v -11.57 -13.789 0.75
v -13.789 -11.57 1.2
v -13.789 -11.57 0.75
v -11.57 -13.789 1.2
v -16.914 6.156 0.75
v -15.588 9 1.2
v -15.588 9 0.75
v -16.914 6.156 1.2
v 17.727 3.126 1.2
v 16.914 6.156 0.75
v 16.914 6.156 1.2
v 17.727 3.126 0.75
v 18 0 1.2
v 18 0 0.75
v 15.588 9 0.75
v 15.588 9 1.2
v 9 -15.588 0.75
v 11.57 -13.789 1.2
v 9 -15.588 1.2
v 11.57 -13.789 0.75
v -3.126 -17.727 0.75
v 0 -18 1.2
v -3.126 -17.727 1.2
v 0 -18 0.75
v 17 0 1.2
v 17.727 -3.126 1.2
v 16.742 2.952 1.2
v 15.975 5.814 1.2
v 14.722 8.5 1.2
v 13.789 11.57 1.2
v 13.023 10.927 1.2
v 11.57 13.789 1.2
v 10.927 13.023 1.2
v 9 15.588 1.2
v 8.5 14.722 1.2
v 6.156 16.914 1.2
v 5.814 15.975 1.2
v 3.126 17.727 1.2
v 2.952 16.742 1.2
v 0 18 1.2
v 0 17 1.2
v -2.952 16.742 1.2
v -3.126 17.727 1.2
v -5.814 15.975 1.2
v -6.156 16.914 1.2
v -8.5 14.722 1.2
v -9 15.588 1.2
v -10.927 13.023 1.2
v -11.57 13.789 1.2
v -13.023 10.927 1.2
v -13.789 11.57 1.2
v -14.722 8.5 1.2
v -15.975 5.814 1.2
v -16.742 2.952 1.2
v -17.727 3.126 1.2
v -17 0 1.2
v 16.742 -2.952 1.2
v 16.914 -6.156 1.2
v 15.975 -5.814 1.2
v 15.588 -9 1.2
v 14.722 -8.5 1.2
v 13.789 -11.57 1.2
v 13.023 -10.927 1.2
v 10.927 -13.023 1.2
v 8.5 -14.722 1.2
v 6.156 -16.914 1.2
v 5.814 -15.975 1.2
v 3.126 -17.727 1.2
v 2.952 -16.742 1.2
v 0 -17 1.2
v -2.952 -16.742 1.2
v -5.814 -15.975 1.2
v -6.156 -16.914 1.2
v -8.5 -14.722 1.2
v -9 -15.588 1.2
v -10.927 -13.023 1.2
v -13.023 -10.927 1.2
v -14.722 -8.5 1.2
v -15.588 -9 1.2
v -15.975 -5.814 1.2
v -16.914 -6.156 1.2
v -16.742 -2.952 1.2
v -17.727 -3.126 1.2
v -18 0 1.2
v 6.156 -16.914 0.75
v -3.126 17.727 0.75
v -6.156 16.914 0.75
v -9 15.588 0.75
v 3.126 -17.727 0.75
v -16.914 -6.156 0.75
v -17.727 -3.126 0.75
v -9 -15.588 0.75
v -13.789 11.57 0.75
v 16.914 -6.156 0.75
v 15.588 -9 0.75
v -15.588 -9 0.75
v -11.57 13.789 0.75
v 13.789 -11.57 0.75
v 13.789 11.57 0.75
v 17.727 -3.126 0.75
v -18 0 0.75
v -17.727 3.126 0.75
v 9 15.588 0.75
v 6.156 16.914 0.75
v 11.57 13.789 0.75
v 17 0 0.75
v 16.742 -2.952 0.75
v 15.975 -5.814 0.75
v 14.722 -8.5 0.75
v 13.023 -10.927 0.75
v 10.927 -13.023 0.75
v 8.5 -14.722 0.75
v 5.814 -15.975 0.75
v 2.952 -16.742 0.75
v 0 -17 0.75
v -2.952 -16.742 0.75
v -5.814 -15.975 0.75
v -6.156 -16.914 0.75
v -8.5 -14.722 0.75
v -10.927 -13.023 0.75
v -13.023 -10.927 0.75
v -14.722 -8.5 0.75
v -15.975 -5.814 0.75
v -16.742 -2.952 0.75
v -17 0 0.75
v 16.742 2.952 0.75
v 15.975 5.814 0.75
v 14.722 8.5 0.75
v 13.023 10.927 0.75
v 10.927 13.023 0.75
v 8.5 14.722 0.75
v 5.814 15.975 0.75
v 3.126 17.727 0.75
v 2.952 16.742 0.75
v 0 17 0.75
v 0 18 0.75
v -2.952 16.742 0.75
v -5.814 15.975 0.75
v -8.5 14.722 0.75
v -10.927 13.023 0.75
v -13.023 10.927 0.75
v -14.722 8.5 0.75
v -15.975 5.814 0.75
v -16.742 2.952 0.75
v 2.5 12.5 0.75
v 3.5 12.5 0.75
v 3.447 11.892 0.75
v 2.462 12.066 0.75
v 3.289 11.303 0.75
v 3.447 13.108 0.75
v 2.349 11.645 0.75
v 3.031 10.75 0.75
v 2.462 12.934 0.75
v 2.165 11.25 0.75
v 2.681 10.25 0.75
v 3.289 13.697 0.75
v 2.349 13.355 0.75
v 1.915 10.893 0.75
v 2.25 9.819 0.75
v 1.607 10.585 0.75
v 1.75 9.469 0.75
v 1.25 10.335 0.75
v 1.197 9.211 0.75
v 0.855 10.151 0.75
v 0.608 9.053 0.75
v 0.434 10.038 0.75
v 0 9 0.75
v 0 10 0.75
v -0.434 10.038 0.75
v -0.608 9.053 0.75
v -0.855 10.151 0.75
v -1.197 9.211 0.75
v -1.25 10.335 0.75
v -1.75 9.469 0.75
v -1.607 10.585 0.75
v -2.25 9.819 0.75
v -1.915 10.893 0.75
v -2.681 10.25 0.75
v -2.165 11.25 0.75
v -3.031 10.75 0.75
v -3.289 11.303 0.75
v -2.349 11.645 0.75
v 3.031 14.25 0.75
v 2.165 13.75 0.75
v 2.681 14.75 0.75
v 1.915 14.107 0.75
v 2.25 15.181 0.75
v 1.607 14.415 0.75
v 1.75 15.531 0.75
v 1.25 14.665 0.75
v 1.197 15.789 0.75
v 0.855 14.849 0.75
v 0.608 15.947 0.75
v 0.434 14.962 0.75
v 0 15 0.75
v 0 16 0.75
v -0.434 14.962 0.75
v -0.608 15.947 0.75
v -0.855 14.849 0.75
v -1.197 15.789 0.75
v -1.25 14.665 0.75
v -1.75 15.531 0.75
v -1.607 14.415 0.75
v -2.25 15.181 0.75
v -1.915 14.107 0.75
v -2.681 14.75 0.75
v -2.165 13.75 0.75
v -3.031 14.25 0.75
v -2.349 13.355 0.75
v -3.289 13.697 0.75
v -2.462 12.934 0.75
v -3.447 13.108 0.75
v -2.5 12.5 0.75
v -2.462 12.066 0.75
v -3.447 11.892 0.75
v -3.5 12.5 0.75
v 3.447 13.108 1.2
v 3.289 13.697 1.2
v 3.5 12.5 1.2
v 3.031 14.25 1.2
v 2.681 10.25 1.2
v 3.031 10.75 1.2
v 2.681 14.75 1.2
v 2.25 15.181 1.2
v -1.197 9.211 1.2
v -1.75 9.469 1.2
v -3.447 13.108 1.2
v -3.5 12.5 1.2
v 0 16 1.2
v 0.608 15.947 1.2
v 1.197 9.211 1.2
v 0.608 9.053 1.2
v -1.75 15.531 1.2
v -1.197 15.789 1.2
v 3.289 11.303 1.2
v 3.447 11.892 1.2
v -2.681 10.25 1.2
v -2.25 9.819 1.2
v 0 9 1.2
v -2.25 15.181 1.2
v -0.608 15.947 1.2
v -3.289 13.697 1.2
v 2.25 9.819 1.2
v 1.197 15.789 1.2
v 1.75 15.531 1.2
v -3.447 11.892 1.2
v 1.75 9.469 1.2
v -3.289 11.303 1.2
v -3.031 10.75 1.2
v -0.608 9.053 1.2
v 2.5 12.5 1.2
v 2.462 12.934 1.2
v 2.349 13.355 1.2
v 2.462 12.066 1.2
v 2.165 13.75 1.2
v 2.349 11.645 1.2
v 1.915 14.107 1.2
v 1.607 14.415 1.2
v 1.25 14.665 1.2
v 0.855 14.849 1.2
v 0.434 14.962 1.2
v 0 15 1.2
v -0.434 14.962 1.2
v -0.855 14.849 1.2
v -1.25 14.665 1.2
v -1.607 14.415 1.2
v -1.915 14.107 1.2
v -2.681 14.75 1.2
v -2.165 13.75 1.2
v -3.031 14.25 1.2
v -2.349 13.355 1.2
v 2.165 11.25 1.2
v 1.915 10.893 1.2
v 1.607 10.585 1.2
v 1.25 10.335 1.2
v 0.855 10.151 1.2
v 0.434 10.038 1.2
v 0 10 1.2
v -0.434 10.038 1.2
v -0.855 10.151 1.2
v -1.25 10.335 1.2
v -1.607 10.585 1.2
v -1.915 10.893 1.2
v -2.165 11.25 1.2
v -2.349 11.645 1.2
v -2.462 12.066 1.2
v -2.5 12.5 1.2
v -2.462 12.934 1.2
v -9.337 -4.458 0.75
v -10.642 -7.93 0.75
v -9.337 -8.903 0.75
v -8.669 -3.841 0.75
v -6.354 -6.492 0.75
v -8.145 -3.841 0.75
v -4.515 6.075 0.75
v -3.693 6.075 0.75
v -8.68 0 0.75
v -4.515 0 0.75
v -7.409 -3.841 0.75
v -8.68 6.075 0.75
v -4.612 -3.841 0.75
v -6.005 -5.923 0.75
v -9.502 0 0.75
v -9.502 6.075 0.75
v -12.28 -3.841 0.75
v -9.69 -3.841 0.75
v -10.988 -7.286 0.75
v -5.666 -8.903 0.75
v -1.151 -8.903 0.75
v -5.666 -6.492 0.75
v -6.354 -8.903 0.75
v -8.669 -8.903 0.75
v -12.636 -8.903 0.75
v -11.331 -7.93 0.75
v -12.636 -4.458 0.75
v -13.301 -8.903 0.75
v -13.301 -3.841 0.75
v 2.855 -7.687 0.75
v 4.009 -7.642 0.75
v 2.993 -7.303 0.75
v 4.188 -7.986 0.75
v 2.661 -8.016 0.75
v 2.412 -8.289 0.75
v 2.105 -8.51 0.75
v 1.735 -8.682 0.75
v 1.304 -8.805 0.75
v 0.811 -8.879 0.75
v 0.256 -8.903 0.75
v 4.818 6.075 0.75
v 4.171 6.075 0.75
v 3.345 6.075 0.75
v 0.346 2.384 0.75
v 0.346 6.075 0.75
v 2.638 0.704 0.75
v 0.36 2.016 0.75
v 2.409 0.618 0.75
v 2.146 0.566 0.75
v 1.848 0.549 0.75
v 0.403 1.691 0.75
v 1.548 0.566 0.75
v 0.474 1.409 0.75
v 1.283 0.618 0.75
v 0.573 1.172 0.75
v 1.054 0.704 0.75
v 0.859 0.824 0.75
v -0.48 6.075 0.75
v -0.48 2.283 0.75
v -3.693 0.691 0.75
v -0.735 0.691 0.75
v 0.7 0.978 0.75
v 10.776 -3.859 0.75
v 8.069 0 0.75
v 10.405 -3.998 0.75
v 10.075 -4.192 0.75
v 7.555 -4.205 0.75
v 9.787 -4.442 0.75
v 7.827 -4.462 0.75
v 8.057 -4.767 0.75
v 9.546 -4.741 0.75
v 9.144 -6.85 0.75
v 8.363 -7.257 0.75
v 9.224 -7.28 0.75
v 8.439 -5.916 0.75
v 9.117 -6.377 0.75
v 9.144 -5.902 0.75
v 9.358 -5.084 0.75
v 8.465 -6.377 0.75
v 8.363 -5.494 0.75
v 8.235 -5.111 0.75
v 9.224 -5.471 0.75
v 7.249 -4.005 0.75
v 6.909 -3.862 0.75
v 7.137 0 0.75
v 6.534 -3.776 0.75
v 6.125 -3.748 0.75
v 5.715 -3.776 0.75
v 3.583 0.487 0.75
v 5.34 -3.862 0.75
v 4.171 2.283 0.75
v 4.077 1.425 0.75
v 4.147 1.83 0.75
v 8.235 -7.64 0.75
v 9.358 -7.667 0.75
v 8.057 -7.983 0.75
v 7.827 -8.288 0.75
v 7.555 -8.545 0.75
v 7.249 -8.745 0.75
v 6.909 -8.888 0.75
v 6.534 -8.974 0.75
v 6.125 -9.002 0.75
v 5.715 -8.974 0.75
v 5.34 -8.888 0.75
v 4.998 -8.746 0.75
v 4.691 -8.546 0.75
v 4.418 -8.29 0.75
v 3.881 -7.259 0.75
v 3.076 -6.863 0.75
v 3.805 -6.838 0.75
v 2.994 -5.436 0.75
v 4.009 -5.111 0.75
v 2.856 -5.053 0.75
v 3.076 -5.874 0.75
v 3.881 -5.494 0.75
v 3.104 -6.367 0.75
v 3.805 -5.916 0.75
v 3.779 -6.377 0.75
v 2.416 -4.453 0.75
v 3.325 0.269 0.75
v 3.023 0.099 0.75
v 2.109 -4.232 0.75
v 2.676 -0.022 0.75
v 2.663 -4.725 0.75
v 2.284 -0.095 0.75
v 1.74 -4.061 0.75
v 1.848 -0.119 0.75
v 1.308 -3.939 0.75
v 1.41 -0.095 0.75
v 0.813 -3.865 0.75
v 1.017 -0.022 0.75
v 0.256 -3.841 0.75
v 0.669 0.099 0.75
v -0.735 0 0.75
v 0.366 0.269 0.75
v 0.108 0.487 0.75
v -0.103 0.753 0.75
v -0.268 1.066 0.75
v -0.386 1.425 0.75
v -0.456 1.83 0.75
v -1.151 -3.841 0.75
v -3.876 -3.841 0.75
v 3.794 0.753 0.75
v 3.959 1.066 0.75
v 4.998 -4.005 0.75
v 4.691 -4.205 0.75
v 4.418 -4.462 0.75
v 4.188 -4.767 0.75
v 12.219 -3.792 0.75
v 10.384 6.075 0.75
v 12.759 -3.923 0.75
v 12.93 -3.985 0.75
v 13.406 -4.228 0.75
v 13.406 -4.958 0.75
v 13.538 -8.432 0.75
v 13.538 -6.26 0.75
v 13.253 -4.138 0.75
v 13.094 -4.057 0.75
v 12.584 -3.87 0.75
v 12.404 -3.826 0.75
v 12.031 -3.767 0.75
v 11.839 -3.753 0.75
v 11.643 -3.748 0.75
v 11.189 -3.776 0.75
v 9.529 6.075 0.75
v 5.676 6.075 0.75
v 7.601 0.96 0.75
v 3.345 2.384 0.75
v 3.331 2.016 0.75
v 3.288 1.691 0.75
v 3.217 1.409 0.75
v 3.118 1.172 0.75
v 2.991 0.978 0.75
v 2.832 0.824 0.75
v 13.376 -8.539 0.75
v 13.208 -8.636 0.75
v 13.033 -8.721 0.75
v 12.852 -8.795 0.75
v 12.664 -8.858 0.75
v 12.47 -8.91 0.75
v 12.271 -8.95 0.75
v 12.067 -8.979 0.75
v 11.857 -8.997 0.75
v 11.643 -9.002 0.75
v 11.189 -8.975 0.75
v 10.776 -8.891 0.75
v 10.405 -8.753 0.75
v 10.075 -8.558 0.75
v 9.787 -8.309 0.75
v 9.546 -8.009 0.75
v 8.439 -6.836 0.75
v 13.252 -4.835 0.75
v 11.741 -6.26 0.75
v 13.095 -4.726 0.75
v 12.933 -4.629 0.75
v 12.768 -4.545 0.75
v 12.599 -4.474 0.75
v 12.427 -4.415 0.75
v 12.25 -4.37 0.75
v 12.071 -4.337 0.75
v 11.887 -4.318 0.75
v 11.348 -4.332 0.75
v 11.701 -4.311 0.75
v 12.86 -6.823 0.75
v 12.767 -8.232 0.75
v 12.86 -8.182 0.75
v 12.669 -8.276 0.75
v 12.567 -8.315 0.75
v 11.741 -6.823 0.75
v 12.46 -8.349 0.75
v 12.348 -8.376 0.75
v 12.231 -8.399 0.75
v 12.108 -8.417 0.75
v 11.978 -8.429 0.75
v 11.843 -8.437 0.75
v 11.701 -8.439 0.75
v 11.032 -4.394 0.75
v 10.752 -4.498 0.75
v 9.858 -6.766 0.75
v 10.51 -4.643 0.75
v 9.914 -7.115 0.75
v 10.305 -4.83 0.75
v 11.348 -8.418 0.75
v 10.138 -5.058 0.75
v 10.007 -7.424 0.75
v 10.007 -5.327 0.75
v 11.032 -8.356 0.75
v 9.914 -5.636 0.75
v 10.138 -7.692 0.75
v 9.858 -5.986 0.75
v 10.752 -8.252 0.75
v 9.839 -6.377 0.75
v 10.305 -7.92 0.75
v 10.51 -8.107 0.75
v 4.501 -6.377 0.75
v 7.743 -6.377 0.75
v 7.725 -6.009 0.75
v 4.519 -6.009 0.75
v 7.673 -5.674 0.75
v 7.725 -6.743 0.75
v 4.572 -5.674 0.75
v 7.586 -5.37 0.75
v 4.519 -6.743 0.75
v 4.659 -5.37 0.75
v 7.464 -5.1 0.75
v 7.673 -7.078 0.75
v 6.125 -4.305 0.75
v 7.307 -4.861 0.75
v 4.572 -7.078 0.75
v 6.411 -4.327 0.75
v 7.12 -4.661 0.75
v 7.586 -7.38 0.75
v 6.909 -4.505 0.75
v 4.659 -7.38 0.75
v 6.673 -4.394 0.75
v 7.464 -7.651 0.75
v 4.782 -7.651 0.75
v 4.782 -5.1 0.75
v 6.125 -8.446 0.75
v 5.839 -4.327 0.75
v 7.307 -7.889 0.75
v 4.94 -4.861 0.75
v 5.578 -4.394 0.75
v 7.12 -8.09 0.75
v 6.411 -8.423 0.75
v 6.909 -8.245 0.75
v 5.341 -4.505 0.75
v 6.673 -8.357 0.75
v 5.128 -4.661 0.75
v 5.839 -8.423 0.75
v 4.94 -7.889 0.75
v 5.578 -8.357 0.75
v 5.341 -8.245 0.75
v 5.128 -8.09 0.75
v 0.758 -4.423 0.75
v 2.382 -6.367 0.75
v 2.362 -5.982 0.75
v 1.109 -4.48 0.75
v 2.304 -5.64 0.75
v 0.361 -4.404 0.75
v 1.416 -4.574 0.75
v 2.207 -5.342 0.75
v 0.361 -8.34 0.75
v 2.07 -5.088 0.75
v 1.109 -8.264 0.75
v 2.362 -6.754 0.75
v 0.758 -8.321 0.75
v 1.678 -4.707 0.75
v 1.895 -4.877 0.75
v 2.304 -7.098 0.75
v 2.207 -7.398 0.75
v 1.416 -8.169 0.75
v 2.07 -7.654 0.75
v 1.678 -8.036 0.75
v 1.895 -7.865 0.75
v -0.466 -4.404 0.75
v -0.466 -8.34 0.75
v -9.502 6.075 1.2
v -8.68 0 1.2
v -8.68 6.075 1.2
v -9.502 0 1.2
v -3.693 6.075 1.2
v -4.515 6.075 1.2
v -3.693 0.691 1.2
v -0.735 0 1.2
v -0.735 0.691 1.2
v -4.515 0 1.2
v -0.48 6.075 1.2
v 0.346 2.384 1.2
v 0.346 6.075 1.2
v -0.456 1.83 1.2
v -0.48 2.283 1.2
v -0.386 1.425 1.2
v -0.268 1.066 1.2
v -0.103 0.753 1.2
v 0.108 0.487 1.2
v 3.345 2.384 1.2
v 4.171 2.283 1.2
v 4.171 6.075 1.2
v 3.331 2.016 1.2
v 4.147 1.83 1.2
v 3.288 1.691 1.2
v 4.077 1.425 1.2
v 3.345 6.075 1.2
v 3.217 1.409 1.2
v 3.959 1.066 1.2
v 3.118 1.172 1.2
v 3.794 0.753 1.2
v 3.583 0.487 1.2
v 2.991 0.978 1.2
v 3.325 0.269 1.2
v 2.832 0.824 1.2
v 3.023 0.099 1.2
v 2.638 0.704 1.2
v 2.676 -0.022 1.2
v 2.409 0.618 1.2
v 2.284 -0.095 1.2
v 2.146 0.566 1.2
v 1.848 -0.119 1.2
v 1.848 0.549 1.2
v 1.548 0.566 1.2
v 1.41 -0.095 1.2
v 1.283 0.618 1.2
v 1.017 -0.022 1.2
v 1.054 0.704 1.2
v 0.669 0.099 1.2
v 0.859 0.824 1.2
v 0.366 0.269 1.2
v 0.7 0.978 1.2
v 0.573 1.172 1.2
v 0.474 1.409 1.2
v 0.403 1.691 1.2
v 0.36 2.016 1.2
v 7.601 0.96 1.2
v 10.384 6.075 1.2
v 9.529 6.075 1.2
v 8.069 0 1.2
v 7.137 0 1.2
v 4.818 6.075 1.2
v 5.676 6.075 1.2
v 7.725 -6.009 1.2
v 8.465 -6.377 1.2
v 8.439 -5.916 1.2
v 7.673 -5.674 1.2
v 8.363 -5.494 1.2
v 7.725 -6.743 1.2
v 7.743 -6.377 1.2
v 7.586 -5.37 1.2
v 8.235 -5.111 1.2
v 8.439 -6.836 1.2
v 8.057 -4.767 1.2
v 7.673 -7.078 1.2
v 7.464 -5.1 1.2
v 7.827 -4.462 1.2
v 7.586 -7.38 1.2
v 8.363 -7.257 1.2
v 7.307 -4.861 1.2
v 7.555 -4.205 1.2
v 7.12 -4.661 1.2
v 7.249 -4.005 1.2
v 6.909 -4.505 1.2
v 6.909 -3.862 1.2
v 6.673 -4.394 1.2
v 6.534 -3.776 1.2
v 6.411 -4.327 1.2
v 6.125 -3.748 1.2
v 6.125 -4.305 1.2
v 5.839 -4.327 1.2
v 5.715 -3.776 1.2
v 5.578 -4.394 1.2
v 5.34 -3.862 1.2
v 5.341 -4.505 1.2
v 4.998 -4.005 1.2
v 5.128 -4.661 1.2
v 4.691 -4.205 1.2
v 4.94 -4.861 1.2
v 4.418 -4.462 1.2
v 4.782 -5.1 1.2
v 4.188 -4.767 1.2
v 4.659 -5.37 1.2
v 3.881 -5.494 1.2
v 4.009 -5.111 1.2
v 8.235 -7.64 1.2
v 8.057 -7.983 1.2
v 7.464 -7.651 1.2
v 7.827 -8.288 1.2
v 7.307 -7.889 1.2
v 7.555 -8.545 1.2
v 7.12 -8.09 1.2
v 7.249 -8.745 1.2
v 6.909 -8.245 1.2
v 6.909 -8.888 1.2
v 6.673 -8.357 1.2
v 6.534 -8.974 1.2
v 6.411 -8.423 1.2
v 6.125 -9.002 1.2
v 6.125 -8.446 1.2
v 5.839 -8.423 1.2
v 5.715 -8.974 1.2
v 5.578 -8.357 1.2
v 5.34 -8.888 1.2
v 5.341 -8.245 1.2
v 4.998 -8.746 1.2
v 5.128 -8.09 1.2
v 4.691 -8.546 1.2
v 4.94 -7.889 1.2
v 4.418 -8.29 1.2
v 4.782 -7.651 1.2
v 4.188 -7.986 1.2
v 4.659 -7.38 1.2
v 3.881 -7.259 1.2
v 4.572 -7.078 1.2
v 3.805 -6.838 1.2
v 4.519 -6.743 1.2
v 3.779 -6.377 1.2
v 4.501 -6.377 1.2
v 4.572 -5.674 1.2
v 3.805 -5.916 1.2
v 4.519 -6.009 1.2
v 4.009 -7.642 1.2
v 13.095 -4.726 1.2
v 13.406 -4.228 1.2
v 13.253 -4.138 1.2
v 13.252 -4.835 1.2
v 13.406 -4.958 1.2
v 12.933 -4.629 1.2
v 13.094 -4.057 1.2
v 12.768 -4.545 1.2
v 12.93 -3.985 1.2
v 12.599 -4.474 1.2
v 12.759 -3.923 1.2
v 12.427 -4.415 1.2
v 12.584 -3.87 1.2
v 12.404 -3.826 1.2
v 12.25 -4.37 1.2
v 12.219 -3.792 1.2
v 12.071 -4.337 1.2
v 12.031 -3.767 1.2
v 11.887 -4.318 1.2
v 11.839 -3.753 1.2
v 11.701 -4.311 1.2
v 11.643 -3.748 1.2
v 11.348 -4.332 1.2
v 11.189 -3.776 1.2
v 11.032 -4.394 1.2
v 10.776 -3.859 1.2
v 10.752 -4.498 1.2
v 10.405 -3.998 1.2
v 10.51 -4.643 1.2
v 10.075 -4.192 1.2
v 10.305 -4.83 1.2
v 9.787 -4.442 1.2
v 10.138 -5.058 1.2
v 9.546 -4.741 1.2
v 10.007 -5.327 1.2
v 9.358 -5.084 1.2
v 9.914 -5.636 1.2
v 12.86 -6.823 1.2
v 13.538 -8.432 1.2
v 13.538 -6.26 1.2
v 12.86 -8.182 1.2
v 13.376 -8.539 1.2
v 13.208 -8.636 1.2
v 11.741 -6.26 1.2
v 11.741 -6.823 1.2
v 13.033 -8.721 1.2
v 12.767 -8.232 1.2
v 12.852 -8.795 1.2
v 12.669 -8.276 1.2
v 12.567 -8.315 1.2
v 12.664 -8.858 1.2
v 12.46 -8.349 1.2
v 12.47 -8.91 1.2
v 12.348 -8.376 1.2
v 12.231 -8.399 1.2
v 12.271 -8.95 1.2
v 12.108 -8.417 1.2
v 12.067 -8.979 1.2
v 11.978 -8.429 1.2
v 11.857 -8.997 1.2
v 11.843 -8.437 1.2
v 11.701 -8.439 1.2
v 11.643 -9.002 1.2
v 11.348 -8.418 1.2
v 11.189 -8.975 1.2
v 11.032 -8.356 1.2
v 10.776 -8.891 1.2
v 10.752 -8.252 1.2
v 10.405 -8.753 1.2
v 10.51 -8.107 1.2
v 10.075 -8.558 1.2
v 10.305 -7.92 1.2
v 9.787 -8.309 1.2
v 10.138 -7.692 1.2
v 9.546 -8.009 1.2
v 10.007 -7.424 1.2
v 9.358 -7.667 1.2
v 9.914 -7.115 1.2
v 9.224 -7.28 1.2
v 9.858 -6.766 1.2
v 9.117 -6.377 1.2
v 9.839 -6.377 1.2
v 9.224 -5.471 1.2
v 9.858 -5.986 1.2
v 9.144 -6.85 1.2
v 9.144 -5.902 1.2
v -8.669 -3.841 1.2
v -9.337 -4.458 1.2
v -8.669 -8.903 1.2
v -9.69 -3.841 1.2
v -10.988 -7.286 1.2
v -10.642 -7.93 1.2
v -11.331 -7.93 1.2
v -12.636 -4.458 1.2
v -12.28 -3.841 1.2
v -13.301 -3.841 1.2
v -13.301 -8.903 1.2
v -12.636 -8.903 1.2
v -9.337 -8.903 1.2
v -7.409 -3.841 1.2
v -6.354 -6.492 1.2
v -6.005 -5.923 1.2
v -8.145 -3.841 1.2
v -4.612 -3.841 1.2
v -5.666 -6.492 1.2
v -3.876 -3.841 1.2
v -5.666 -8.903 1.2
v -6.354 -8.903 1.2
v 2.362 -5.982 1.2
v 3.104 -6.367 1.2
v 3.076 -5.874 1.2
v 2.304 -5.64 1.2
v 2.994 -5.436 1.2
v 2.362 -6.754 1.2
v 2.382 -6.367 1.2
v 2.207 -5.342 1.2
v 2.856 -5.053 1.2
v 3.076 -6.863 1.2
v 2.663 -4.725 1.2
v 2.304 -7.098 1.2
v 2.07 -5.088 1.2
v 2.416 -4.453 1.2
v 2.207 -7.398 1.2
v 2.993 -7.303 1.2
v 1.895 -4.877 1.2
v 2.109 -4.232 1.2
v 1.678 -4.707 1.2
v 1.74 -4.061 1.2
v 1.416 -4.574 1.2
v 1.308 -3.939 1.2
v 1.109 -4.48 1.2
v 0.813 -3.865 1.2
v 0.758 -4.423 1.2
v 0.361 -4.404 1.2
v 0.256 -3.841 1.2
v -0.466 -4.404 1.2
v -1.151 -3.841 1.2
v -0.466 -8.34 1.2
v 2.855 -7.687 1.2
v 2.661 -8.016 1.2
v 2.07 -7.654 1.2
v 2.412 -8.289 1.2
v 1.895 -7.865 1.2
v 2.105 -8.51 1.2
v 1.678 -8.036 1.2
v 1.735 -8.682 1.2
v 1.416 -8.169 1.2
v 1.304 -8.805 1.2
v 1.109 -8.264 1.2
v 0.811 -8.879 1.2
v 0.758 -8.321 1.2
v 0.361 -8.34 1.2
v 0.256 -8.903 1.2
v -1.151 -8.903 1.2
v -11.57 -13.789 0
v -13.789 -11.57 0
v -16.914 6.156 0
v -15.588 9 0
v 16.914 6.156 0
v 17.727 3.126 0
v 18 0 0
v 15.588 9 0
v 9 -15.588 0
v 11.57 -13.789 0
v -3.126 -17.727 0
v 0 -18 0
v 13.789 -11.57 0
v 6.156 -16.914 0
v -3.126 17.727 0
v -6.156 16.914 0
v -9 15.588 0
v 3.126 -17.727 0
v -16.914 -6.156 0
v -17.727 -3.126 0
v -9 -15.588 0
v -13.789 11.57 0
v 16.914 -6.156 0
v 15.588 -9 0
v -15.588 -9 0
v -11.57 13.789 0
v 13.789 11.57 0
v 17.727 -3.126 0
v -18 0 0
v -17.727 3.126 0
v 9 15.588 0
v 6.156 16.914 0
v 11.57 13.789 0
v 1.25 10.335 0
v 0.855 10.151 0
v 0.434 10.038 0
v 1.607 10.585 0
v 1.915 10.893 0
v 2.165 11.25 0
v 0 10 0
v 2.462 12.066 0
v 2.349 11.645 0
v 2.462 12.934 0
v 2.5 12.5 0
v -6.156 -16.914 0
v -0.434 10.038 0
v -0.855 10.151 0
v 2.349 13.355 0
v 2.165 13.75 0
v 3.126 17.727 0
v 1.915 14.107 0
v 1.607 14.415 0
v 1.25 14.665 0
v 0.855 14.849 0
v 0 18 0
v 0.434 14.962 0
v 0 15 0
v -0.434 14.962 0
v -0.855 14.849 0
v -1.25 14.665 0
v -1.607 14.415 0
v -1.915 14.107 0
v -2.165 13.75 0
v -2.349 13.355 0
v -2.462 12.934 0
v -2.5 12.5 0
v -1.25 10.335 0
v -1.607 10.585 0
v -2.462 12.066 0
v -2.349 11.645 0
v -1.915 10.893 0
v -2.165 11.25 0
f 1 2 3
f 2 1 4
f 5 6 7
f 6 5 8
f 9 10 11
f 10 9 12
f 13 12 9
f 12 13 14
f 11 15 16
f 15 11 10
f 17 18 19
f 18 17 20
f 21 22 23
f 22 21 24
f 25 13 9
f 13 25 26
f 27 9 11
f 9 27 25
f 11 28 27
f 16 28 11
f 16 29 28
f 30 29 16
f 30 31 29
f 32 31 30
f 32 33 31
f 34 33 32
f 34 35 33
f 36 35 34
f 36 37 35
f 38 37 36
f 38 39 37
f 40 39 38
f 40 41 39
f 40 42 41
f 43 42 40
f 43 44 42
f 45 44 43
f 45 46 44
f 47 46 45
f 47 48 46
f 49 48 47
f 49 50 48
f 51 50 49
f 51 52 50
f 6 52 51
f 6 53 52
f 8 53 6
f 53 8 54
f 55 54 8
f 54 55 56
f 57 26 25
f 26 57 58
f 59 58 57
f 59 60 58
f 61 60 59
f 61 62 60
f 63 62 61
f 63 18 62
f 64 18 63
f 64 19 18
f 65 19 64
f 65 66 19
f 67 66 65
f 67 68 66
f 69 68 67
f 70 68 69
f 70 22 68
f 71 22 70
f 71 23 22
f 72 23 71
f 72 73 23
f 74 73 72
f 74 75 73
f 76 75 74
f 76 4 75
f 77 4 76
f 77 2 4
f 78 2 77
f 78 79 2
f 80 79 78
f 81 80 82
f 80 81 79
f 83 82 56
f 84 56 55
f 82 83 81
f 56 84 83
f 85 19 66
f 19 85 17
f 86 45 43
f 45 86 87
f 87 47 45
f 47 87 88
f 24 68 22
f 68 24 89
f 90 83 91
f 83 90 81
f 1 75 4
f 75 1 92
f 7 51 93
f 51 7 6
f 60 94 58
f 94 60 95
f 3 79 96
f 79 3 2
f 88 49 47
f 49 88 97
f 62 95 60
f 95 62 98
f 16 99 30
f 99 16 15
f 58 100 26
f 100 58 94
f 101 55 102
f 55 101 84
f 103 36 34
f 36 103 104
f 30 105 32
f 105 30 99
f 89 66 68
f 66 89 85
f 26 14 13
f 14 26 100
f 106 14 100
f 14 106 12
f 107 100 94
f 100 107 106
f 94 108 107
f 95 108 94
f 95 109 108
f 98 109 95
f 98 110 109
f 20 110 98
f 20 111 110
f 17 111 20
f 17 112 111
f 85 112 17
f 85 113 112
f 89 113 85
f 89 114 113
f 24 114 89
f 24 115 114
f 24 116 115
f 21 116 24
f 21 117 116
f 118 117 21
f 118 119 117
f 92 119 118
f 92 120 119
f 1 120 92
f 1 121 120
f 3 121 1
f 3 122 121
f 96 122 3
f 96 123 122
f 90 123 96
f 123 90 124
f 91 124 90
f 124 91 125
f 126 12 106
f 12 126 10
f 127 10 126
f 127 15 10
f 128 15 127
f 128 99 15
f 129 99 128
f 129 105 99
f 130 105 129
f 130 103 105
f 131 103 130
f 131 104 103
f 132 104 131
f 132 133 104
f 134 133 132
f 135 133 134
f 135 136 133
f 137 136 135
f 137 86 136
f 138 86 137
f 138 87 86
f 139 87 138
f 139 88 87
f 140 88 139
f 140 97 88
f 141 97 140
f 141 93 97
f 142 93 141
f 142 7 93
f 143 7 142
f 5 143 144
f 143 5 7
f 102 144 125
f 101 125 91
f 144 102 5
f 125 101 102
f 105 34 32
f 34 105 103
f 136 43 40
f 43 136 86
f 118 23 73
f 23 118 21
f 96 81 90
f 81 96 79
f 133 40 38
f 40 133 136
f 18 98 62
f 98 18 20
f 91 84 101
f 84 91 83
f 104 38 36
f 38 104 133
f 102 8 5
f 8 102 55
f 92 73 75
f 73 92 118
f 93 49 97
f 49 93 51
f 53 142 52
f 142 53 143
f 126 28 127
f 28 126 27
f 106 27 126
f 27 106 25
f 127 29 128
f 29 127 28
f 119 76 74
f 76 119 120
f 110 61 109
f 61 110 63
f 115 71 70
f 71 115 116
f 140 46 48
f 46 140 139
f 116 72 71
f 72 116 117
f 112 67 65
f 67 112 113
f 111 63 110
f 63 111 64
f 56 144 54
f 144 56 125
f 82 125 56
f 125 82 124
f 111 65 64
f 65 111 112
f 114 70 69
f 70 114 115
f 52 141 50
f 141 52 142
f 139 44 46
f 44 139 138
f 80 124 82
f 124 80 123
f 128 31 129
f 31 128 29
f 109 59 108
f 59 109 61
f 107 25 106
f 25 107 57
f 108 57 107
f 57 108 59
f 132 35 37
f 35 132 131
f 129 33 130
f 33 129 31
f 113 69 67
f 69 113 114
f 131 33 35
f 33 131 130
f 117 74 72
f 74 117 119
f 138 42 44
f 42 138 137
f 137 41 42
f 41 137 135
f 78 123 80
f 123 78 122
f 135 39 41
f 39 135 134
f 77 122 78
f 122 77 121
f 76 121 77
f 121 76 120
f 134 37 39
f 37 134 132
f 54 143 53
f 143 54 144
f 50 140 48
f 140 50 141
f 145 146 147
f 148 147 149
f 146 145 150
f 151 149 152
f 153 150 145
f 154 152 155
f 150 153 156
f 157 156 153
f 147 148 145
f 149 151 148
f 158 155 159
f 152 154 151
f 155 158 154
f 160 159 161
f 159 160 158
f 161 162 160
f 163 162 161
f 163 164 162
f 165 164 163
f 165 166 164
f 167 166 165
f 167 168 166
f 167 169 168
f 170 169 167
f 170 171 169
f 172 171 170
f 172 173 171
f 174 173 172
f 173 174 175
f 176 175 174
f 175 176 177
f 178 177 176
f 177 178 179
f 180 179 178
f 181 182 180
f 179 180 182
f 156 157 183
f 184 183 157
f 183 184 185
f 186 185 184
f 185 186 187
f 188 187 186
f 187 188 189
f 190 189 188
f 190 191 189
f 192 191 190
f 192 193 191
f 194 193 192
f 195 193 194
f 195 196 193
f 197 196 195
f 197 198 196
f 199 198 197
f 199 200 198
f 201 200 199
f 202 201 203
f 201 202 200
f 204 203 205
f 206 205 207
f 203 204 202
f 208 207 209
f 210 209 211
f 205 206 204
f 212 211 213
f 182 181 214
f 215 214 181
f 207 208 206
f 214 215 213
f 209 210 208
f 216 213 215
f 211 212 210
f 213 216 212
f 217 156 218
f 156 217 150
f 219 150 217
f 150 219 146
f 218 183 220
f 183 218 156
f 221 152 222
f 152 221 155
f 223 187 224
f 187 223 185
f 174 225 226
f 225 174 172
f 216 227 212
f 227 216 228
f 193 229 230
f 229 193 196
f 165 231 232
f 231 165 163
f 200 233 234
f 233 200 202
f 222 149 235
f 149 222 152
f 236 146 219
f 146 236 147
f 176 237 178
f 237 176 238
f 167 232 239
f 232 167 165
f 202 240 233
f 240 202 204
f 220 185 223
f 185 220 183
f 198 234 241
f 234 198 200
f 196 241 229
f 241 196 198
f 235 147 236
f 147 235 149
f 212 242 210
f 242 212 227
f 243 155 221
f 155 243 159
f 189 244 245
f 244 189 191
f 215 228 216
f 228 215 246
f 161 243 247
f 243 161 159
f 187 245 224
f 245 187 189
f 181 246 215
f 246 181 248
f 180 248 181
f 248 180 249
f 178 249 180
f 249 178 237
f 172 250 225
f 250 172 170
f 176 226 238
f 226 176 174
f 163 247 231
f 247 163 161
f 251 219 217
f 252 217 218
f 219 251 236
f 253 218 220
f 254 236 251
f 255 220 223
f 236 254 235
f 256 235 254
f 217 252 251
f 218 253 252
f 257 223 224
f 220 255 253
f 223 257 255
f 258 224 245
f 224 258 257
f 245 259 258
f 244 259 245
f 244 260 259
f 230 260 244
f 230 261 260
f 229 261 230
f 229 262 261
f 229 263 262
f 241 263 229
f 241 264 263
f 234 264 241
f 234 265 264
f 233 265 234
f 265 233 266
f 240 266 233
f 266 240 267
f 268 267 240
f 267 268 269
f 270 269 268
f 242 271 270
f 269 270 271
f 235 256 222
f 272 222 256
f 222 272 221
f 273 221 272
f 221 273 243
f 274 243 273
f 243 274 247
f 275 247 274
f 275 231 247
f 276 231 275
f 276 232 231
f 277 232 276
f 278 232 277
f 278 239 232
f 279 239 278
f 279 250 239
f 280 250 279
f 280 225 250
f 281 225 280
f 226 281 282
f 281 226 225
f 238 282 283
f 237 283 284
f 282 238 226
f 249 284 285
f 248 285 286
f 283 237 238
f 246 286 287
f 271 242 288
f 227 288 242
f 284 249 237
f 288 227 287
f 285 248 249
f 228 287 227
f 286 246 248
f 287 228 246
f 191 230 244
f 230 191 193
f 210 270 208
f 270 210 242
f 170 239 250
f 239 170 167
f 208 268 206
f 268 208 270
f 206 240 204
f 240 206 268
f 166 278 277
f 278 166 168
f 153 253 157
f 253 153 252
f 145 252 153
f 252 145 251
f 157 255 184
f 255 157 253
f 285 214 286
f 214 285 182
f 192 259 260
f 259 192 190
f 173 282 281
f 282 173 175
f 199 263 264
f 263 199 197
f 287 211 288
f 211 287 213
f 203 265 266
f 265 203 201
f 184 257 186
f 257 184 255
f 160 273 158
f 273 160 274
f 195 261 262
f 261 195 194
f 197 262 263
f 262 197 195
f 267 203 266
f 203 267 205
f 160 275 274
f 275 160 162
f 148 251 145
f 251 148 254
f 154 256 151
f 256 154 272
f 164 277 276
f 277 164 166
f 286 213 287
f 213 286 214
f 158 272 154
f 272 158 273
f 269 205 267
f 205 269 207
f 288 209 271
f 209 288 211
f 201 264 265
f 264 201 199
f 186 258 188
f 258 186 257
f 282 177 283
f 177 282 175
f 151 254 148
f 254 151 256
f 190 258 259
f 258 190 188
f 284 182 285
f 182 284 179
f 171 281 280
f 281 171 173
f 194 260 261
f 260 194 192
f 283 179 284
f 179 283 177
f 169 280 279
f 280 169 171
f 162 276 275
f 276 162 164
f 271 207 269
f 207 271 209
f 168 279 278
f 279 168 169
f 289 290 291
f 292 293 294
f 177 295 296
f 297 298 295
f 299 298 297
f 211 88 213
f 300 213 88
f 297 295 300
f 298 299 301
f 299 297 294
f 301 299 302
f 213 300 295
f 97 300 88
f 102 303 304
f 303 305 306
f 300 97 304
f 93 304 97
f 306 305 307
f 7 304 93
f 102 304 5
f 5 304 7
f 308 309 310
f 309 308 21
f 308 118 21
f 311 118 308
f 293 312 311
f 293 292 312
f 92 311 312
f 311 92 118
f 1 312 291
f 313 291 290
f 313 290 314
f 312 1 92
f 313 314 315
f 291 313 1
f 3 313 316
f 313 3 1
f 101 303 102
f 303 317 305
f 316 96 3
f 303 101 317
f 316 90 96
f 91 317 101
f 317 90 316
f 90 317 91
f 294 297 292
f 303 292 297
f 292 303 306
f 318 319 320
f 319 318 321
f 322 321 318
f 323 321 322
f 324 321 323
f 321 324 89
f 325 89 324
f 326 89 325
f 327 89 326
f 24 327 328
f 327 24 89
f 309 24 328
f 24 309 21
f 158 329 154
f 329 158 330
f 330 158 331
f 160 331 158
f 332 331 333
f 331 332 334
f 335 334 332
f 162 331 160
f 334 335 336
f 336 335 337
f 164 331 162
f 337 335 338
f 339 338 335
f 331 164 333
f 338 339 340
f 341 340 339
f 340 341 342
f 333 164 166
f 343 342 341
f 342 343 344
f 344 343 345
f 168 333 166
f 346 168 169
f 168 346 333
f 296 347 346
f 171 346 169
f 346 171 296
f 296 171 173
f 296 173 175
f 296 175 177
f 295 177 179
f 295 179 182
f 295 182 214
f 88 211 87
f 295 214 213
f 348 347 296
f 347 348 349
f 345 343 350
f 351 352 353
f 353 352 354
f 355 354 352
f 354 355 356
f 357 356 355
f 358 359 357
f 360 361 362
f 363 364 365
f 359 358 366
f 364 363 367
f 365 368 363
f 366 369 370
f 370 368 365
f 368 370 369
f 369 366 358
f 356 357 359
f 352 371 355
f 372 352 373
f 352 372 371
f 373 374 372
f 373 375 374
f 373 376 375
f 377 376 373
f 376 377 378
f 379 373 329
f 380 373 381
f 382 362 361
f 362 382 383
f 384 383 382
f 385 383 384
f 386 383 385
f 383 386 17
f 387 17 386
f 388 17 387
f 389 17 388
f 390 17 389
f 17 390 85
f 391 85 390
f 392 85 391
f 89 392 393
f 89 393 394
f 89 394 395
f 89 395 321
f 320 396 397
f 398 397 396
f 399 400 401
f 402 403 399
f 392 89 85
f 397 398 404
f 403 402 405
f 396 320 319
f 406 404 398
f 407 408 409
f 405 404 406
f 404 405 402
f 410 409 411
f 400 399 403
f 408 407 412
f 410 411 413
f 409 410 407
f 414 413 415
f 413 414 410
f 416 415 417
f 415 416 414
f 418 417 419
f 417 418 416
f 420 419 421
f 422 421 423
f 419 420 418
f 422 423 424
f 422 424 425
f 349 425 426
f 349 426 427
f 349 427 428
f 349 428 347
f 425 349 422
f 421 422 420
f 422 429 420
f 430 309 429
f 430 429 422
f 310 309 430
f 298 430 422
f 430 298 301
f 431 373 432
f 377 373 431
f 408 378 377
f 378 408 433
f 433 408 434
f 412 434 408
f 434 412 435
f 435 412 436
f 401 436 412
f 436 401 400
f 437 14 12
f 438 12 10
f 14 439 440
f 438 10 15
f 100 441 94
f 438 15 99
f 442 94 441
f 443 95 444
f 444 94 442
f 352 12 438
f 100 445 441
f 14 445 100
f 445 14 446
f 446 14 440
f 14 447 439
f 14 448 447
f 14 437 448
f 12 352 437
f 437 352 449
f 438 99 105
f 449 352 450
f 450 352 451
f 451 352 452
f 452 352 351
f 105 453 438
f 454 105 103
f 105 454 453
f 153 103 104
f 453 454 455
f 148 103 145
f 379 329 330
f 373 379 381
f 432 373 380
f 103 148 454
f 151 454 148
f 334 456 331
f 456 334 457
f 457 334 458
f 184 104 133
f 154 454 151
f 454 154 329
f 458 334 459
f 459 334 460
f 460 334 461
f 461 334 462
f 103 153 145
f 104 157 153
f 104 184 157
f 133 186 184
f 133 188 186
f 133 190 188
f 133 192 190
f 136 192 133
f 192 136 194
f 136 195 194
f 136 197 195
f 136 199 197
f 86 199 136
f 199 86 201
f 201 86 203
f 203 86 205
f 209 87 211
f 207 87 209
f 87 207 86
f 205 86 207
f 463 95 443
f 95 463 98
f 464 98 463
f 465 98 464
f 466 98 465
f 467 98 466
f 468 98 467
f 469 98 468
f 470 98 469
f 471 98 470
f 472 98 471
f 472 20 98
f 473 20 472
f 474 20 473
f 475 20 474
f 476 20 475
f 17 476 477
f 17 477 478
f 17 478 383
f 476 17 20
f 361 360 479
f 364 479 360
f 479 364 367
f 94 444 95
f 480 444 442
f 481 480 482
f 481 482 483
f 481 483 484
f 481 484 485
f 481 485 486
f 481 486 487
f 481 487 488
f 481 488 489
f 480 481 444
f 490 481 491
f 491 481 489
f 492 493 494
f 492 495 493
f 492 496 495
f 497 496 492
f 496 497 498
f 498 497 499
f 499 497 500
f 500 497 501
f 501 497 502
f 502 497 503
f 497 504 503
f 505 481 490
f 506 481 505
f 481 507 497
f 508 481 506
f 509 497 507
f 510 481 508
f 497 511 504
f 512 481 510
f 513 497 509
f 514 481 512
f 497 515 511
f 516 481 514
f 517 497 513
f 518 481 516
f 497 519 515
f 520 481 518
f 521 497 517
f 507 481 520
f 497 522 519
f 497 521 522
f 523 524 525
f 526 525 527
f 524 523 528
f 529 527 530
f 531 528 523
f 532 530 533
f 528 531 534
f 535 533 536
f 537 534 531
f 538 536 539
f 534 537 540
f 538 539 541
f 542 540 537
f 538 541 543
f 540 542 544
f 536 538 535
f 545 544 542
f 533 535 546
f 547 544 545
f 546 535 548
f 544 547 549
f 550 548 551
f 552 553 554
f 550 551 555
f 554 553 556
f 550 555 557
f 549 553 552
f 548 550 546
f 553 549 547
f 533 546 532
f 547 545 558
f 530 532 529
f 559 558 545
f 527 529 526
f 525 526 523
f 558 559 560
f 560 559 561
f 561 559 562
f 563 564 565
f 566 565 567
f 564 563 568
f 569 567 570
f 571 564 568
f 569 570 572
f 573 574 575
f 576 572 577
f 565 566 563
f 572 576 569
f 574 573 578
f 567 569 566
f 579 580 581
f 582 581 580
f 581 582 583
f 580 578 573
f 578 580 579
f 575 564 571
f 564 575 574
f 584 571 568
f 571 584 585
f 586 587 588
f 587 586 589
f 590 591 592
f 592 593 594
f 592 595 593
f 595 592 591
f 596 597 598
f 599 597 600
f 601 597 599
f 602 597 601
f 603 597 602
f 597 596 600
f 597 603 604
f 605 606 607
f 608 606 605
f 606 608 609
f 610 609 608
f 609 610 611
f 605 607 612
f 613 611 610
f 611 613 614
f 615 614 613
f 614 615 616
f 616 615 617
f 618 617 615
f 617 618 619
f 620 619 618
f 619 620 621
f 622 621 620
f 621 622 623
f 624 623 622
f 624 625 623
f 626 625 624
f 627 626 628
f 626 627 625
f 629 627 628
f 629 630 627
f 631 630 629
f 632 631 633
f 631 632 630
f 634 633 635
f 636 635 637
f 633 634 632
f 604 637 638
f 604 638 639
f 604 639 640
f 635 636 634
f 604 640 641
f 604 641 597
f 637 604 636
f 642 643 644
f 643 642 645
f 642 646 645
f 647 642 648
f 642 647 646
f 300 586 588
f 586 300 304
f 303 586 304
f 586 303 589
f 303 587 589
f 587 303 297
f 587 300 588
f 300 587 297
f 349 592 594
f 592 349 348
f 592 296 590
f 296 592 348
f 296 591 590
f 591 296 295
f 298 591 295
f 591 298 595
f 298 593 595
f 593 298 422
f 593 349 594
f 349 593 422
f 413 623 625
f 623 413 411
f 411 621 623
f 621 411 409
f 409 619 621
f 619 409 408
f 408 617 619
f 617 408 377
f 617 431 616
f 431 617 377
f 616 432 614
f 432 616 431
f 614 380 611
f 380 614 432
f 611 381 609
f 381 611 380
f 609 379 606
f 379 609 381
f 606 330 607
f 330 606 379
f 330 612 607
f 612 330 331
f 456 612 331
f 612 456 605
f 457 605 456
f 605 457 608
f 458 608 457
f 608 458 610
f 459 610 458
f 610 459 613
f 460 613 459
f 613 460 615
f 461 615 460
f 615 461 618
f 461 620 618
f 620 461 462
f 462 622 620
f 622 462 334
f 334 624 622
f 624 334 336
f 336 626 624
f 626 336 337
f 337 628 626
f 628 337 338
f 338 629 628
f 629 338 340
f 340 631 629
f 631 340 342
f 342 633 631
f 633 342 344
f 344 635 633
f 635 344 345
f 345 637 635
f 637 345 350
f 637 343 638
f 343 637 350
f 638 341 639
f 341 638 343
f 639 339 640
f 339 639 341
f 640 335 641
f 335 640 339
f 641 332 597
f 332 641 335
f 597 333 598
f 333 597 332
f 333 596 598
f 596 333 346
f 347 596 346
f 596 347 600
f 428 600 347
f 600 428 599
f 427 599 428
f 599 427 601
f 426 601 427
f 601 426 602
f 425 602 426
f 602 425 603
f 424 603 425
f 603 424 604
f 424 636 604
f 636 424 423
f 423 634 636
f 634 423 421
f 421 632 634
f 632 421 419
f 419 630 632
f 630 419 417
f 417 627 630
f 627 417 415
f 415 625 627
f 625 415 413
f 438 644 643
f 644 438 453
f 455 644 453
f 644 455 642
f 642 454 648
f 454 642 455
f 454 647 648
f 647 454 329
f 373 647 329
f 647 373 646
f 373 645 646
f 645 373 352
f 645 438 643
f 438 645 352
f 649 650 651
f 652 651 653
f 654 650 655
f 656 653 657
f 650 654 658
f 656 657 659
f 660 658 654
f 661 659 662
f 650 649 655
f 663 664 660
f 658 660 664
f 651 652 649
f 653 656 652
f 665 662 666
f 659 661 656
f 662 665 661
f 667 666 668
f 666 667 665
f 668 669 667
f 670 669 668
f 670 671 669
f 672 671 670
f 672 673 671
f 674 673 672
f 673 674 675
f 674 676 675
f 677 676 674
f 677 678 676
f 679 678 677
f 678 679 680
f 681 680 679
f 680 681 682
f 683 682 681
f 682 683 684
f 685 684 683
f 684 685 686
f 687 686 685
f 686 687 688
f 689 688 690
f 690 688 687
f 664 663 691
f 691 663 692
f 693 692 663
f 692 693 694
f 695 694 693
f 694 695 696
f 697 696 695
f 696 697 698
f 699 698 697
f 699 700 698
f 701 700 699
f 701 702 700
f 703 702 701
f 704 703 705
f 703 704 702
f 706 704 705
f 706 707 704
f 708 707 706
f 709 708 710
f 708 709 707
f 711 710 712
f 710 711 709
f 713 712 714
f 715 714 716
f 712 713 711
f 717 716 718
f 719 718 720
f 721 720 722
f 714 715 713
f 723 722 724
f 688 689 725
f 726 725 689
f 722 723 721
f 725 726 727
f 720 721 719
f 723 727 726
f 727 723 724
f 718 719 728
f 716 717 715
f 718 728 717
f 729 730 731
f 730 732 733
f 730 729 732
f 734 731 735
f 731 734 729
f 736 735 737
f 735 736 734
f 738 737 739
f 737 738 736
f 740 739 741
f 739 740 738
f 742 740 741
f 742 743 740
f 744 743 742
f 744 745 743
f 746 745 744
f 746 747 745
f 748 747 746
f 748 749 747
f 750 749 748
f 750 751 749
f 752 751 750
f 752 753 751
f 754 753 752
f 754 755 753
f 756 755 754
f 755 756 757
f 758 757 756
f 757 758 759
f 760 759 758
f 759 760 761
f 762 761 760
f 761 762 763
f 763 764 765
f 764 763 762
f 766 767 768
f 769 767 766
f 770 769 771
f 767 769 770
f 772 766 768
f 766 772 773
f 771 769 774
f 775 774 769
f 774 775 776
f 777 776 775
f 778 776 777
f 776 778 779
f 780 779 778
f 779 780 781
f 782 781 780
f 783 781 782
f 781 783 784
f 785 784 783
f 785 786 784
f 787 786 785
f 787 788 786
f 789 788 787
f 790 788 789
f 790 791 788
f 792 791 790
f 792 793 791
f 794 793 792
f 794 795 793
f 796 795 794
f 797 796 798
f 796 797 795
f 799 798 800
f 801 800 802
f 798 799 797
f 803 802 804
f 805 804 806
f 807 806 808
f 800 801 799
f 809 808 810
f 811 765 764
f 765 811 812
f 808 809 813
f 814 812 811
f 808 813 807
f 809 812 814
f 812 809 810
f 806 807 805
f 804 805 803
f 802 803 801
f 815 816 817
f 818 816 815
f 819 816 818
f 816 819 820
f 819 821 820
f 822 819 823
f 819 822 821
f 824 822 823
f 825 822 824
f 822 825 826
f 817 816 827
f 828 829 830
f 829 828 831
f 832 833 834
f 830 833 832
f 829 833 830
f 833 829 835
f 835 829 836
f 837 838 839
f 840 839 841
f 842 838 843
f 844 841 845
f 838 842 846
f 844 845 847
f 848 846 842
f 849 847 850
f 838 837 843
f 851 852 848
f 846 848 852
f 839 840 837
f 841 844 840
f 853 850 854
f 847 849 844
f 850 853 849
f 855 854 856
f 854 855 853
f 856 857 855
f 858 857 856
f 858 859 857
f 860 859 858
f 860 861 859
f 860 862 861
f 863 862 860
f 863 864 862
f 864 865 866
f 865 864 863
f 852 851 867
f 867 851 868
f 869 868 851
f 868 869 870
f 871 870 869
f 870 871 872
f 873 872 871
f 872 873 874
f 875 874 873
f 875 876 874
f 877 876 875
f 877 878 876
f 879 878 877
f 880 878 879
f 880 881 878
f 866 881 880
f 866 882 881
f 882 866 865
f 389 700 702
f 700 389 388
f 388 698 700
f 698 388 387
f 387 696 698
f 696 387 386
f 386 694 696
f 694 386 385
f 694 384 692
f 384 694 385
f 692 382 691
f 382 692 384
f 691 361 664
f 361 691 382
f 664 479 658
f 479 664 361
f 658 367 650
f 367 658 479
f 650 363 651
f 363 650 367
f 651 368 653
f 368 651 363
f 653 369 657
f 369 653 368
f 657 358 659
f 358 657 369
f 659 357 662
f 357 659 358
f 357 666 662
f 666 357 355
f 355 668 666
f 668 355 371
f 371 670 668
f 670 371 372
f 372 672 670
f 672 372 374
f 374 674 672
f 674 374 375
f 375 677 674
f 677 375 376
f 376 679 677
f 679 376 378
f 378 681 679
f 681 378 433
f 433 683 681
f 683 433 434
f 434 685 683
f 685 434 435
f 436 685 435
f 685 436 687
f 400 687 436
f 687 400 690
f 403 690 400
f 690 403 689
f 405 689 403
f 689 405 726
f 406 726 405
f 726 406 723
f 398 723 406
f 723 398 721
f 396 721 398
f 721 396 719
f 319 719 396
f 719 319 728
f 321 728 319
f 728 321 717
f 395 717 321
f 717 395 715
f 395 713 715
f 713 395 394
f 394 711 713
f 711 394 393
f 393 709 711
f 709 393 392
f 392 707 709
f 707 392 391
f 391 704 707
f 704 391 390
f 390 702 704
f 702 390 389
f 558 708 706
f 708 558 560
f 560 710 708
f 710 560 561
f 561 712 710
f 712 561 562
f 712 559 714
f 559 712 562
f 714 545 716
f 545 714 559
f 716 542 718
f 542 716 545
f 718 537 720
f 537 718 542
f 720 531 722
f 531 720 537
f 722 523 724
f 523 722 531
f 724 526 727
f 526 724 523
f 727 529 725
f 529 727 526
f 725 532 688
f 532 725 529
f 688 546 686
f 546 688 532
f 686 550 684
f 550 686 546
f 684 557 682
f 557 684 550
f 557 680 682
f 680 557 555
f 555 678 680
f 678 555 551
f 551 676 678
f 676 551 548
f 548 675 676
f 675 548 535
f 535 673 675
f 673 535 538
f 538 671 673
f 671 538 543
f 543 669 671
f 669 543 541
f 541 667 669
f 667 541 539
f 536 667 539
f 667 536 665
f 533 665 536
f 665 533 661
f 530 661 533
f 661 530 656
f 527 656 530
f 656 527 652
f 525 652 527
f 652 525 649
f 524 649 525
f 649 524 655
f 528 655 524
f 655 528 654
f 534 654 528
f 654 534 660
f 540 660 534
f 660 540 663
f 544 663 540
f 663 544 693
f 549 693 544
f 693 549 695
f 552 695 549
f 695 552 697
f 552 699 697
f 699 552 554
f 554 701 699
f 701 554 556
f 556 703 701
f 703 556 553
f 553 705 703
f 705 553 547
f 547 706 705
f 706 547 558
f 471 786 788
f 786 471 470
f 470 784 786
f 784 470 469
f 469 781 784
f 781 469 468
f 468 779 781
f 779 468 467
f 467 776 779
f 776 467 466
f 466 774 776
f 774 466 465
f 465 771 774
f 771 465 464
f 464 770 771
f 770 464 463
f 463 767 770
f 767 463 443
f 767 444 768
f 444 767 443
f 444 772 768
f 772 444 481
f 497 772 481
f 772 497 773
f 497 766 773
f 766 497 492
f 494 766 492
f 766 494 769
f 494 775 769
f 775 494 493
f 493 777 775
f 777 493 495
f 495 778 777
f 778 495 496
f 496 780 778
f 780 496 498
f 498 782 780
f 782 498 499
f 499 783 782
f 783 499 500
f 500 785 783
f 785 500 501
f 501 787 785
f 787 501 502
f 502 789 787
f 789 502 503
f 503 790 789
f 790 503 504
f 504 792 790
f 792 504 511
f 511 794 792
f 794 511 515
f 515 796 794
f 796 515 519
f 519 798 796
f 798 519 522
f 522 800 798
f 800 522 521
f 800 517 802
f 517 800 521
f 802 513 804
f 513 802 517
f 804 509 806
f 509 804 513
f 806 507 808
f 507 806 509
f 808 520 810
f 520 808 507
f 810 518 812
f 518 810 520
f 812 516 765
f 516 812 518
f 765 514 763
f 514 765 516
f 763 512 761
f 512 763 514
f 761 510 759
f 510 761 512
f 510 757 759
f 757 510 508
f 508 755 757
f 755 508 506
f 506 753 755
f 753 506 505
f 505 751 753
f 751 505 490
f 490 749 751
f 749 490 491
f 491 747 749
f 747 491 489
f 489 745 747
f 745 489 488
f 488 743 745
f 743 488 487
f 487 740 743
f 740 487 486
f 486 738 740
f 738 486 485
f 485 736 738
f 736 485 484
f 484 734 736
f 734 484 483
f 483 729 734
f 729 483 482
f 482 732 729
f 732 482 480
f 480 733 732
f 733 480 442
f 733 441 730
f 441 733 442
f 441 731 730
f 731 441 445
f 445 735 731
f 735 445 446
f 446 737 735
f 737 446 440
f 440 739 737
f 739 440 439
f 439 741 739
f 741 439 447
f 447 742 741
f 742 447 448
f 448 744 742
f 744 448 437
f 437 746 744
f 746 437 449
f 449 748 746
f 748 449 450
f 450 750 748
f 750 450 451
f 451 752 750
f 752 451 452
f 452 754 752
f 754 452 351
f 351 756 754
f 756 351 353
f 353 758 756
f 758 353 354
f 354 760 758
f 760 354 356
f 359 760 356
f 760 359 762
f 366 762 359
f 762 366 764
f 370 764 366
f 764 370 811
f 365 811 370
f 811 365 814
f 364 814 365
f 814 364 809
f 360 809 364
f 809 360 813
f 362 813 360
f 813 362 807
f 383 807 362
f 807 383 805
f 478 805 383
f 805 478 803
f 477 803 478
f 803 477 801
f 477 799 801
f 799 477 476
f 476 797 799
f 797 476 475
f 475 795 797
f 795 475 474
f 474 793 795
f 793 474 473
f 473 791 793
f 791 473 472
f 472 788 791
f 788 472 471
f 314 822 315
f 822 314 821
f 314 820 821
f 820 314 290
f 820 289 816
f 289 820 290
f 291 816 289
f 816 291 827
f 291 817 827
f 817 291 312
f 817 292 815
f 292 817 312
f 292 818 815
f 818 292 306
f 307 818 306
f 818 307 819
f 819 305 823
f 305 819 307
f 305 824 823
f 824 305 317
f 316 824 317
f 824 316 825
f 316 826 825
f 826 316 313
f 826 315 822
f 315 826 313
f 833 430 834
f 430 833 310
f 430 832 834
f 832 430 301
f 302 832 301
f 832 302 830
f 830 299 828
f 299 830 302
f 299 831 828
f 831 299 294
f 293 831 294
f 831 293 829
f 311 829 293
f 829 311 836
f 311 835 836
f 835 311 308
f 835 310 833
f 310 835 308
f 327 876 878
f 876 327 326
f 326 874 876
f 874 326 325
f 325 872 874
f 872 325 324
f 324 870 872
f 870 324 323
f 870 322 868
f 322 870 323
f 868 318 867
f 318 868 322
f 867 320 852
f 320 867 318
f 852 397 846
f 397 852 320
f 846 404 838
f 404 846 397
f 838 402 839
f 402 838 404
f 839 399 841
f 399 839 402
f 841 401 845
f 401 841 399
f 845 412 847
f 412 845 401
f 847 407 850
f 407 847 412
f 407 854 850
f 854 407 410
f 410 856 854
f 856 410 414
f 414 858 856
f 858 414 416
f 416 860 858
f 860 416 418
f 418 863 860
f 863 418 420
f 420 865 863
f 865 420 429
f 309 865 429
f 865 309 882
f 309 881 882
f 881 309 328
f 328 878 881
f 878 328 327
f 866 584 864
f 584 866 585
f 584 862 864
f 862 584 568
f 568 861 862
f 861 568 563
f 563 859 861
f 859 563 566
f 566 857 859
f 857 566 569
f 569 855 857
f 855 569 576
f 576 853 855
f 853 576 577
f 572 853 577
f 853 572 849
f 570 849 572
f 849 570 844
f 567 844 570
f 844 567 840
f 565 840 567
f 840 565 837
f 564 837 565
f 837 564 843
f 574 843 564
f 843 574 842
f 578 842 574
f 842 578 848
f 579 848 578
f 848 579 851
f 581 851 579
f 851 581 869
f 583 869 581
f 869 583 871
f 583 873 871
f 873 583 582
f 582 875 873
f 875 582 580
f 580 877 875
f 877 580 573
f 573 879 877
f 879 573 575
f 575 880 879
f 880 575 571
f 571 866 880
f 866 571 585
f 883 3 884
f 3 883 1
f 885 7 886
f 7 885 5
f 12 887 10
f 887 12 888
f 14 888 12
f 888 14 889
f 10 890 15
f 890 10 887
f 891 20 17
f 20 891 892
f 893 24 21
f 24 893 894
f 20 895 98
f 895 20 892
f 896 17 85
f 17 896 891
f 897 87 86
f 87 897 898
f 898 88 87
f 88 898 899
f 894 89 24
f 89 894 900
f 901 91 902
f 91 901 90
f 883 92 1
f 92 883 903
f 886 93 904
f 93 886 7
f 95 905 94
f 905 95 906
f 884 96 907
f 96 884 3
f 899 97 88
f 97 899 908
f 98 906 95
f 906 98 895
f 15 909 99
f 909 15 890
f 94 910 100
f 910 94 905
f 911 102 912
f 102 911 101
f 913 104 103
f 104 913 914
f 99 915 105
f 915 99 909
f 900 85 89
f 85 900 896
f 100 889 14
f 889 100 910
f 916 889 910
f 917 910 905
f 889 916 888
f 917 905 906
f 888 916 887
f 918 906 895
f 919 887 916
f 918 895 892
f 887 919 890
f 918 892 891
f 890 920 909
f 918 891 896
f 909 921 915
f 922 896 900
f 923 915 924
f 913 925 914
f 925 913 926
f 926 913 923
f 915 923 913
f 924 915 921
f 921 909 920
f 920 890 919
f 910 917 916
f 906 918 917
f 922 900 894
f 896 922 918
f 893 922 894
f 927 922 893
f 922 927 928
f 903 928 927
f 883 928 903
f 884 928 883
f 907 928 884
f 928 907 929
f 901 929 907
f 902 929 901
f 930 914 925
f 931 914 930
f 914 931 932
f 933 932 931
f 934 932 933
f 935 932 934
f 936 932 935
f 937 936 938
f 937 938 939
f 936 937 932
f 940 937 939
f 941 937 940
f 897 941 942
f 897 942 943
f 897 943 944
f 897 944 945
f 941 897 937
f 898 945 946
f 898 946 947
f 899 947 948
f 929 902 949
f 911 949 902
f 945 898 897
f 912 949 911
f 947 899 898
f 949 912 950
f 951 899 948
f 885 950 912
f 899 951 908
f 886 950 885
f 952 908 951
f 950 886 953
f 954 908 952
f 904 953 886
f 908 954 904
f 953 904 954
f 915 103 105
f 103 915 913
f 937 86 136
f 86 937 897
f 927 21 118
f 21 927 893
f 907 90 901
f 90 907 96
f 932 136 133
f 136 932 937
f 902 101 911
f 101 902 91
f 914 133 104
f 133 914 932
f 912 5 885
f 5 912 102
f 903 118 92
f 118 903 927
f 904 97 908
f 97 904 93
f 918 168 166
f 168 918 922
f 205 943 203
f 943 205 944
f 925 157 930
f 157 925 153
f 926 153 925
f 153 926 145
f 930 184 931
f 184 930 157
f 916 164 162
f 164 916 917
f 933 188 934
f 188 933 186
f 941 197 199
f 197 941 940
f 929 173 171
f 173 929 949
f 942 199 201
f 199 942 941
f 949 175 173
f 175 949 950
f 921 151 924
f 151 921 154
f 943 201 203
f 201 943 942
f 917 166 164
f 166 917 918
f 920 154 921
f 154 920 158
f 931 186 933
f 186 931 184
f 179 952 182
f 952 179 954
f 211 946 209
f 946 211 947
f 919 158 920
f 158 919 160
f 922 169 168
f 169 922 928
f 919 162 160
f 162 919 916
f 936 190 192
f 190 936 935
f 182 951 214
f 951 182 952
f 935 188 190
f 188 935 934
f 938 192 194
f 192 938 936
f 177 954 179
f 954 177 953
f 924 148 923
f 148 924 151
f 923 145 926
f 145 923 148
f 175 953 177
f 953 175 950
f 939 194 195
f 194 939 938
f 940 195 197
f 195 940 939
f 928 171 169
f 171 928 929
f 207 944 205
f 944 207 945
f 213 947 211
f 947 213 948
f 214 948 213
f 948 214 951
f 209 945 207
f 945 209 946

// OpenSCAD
/* [Text] */
// pet name (Holding the WIN key and tap the period may allow you to add symbols)
line_1_text = "I LUV";
// try 2-6, decimals allowed
line_1_size = 6;
// phone number
line_2_text = "MY DOG";
// try 2-6, decimals allowed
line_2_size = 5;
// ISO language code (en, de, it, fr, es...) may help with non-standard characters
text_language = "en";
fontname="DejaVu Sans:DejaVu Sans Condensed Bold"; // [DejaVu Sans:DejaVu Sans Condensed Bold, Coustard:Coustard bold, Permanent Marker, Gloria Hallelujah, Arial:Arial bold, Pacifico, Courgette, Domine:Domine bold, Ultra, Bevan ]


/* [Appearance] */
// (mm)
total_diameter = 36;
// (mm)
hole_diameter = 5;
// from side to side (mm)
hole_distance = 3;
// (mm)
border_width = 1;

/* [Print Settings] */
number_of_text_layers = 3; 
number_of_base_layers = 5;
// (mm)
first_layer_height = 0.15;
// (mm) 
normal_layer_height = 0.15; 

/* [Hidden] */
total_radius = total_diameter / 2;                                                      // computed overall radius
hole_radius = hole_diameter / 2;                                                        // computed hole radius
text_height = normal_layer_height * number_of_text_layers;                              // text and rim extrusion height
plate_height = (number_of_base_layers - 1) * normal_layer_height + first_layer_height;  // base plate height in mm
$fn = 36;         

// default number of fragments

// Border
if(border_width > 0){
    translate([0, 0, plate_height + text_height / 2] ) { 
        difference() {
            cylinder(h = text_height, r = total_radius, center = true);
            cylinder(h = text_height + 1, r = total_radius - border_width, center = true);
        }
        translate([0, total_radius - hole_distance - hole_radius, 0]) {
            difference() {
                cylinder(h = text_height, r = hole_radius + border_width, center = true);
                cylinder(h = text_height + 1, r = hole_radius, center = true);
            }
        }
    }
}

// Text
translate([0, 0, plate_height]) {
    // Name (text line 1)
    linear_extrude(height = text_height) text(text = line_1_text, size = line_1_size, font = fontname, halign = "center", valign = "baseline", language = text_language);

    // Phone number (text line 2)
    translate([0, - total_radius / 2, 0]) linear_extrude(height = text_height) text(text = line_2_text, size = line_2_size, font = fontname, halign = "center", valign = "bottom", language = text_language);
}
// Base plate with hole
translate([0, 0, plate_height / 2]) {
    difference() {
        cylinder(h = plate_height, r = total_radius, center = true);
        translate([0, total_radius - hole_distance - hole_radius, 0]) cylinder(h = plate_height + 1, r = hole_radius, center = true);
    }
}
